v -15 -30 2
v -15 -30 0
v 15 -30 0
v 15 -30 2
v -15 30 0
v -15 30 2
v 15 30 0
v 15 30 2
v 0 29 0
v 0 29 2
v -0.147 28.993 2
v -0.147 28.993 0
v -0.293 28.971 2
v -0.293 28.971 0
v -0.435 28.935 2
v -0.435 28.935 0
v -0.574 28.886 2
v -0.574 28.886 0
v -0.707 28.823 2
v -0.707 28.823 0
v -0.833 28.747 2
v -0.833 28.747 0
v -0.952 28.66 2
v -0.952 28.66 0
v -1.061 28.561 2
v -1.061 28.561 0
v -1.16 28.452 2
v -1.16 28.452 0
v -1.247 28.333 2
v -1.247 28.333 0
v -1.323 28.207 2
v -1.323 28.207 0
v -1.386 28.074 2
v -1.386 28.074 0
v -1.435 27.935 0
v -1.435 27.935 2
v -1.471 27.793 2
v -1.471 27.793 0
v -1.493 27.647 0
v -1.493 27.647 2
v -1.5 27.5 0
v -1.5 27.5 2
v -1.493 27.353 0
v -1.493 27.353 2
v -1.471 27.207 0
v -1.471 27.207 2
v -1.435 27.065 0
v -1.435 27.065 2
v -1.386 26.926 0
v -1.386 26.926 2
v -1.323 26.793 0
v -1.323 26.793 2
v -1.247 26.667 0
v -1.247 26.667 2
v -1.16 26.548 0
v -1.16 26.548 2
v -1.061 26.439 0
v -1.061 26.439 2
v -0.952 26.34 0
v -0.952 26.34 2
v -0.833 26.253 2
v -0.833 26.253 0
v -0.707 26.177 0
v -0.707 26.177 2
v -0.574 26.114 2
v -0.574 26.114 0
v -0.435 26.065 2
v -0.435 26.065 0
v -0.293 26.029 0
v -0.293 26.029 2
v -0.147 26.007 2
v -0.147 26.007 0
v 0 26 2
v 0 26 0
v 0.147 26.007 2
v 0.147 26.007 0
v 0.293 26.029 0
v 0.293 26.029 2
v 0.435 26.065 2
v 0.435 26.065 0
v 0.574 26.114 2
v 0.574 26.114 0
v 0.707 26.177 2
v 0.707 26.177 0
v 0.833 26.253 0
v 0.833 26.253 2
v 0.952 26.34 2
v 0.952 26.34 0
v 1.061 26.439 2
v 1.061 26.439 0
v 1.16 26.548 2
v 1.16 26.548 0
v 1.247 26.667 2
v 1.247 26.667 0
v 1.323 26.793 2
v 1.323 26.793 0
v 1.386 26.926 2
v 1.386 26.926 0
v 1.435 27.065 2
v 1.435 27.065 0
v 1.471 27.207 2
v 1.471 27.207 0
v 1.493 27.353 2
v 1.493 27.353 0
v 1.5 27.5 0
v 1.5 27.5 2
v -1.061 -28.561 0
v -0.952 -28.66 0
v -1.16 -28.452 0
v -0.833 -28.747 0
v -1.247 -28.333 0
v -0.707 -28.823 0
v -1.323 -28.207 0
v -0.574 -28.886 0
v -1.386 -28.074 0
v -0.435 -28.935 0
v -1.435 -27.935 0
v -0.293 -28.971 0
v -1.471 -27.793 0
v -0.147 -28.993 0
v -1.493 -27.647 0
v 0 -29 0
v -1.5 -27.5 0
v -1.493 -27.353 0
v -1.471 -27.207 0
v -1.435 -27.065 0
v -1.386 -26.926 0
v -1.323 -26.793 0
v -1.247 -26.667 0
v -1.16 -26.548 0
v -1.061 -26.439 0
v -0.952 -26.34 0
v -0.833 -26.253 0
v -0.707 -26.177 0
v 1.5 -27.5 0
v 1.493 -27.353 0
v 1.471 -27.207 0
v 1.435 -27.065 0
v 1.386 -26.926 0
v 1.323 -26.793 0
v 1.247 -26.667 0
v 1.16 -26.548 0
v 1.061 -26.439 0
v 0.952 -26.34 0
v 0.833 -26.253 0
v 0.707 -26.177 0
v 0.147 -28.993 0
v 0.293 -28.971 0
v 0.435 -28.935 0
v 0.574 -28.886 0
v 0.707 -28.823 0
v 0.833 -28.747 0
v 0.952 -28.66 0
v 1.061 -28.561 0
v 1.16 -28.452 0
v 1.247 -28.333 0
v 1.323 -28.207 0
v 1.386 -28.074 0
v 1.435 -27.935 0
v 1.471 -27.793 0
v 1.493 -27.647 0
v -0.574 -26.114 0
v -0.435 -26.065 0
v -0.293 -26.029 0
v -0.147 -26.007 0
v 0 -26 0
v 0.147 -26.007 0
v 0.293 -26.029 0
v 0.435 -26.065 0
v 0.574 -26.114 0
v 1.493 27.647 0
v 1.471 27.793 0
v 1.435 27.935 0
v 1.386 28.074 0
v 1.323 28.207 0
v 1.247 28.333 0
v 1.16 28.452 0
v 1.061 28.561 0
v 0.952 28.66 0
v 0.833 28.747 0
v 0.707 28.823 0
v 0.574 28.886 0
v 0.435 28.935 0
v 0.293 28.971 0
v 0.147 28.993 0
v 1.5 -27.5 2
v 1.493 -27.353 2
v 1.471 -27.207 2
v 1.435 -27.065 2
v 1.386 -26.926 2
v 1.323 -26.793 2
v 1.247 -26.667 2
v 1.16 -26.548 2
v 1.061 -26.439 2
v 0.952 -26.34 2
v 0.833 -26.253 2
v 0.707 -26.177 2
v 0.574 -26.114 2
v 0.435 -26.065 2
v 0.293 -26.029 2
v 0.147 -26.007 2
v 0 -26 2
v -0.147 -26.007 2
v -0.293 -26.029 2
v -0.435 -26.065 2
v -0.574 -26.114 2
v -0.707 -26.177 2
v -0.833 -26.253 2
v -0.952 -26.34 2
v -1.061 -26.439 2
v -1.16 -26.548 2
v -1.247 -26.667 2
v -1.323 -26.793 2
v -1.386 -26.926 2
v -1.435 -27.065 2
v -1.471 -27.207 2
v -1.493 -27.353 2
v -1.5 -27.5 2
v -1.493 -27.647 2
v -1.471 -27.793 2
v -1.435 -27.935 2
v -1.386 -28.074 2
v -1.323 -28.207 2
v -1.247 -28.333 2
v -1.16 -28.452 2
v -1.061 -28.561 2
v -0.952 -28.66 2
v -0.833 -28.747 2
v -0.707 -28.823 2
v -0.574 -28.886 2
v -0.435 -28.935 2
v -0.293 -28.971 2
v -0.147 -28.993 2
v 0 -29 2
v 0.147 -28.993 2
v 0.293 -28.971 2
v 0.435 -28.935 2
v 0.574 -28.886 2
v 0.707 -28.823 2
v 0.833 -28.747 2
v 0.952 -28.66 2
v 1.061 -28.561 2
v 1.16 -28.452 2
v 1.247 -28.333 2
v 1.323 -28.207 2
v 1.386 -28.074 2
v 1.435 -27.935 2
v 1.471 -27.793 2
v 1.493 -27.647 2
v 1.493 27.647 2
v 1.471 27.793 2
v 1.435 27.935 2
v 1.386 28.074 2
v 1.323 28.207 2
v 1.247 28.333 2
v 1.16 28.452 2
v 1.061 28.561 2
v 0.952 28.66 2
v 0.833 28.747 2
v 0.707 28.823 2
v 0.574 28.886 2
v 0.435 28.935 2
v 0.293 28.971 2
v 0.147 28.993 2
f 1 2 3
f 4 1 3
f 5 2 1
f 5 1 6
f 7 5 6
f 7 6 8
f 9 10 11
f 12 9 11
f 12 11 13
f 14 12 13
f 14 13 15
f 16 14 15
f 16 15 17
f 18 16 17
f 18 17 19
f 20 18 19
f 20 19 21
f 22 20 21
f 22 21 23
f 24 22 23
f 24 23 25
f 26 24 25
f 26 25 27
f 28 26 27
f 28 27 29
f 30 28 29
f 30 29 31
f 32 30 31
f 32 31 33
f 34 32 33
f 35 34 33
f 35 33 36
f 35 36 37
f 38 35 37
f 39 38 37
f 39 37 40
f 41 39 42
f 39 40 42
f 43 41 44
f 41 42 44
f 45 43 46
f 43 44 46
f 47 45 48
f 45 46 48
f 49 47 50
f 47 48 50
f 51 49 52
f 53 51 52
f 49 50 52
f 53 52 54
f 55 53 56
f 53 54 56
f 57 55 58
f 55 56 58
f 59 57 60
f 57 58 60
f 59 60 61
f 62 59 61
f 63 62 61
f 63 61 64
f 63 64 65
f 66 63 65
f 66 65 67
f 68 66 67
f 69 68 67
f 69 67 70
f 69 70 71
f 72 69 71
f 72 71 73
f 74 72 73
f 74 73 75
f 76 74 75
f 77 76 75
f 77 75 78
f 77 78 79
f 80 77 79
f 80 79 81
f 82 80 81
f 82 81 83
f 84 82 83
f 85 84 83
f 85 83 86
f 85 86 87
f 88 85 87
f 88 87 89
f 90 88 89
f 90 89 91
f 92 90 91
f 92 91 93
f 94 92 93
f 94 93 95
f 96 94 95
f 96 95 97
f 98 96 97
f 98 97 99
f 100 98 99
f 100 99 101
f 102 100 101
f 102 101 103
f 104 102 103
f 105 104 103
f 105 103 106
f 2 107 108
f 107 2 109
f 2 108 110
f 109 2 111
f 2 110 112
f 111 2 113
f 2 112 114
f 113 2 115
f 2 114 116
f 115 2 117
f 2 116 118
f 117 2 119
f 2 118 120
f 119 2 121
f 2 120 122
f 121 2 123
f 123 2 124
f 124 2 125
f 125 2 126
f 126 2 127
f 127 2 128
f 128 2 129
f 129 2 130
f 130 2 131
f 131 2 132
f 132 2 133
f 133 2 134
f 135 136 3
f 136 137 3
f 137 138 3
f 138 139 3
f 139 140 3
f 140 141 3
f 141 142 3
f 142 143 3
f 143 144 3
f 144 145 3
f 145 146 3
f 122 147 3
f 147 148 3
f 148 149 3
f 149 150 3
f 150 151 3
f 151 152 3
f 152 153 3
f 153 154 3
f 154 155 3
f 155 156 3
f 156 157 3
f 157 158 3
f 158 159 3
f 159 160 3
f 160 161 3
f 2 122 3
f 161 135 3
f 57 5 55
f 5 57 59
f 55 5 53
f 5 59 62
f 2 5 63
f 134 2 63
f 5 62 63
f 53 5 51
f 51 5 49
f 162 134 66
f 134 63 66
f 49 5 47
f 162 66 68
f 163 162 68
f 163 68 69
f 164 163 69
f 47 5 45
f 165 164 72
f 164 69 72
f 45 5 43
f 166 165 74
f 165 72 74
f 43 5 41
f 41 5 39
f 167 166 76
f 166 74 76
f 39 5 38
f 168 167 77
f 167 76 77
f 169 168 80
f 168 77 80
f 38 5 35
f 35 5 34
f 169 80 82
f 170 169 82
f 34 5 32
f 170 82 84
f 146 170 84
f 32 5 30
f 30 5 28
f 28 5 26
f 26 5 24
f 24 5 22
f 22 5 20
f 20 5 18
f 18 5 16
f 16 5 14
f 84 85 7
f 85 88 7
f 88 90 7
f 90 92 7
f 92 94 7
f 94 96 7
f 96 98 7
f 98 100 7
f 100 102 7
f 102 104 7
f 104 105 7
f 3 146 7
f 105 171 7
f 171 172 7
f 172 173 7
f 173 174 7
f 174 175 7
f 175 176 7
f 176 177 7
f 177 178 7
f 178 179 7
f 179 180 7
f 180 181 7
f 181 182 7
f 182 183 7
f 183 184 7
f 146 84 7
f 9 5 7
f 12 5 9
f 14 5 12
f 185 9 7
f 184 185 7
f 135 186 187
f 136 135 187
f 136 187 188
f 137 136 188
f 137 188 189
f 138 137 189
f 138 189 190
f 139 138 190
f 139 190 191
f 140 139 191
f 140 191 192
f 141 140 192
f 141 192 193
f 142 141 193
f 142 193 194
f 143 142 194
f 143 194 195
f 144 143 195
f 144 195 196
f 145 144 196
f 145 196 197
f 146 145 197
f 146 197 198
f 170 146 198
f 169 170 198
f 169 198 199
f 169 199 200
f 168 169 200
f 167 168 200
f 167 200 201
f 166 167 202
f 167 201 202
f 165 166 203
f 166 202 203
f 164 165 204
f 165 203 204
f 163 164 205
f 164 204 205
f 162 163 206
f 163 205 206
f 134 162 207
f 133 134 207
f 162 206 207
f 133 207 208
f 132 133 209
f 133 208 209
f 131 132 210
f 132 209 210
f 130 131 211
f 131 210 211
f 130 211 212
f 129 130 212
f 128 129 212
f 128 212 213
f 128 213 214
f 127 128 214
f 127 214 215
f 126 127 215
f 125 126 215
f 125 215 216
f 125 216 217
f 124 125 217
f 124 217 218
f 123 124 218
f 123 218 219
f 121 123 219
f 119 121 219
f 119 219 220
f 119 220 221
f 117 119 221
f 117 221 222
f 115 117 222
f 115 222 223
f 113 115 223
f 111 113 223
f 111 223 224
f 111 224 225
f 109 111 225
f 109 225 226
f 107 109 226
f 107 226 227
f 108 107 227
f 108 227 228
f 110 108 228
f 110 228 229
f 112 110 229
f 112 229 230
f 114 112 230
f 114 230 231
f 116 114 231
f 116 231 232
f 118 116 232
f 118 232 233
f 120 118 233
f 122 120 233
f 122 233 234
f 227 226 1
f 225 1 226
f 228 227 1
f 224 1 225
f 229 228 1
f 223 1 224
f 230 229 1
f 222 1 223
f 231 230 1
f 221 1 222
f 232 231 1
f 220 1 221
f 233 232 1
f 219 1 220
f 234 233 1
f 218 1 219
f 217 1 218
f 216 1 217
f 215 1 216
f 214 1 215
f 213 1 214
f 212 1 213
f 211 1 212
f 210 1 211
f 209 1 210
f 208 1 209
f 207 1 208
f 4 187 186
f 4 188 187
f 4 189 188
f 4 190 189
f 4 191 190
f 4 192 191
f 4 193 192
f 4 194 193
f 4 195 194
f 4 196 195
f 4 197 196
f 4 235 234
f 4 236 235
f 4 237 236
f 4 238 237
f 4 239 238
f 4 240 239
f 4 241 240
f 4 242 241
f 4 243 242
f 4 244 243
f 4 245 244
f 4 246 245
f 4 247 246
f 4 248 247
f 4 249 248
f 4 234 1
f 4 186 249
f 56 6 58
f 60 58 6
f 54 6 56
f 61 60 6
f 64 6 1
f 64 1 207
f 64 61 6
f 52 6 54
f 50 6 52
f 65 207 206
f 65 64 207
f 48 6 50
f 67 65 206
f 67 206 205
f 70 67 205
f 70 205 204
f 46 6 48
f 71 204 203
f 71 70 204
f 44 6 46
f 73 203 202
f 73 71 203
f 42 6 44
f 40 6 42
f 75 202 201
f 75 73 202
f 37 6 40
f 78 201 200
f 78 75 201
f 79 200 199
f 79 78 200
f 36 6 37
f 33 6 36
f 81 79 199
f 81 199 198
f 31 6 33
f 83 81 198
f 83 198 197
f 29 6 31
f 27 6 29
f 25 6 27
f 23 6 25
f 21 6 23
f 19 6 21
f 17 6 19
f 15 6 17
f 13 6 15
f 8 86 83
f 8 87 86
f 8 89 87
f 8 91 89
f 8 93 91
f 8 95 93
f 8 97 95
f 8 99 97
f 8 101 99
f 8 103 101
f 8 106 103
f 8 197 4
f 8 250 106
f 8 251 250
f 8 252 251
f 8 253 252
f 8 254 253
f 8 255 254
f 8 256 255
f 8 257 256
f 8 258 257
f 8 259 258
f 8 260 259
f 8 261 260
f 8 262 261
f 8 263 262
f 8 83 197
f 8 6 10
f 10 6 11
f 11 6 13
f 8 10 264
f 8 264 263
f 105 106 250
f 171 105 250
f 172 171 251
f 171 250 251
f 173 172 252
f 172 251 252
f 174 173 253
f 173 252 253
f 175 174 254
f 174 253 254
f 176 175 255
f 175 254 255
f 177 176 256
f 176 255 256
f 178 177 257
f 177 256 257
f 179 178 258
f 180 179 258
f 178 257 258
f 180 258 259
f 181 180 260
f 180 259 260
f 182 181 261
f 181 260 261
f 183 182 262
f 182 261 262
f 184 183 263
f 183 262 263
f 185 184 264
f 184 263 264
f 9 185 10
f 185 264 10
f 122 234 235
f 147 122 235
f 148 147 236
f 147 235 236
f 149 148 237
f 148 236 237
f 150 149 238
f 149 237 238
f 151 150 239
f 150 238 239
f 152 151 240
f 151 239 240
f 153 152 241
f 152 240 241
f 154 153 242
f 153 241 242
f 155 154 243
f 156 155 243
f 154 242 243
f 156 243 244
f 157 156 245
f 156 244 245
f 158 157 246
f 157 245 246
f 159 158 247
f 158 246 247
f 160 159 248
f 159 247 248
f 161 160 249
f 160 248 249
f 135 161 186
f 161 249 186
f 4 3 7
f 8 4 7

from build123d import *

# Parameters (mm, degrees)
F0_W     = 30
F0_H     = 60
F1_DEPTH = 2
F3_DEPTH = 25


with BuildPart() as f1:
    # F0 (on Top) → F1 (new body)
    with BuildSketch(Plane.XY):
        Rectangle(F0_W, F0_H)
    extrude(amount=F1_DEPTH)

    # F2 (on face) → F3 (cut)
    with BuildSketch(Plane.XY.offset(2)):
        with BuildLine():
            ThreePointArc((1.5, -27.5), (-1.06066, -26.43934), (0, -29))
            ThreePointArc((0, -29), (1.06066, -28.56066), (1.5, -27.5))
        make_face()
        with BuildLine():
            ThreePointArc((1.5, 27.5), (1.06066, 28.56066), (0, 29))
            ThreePointArc((0, 29), (-1.06066, 26.43934), (1.5, 27.5))
        make_face()
    extrude(amount=-F3_DEPTH, mode=Mode.SUBTRACT)


solid = f1.part
